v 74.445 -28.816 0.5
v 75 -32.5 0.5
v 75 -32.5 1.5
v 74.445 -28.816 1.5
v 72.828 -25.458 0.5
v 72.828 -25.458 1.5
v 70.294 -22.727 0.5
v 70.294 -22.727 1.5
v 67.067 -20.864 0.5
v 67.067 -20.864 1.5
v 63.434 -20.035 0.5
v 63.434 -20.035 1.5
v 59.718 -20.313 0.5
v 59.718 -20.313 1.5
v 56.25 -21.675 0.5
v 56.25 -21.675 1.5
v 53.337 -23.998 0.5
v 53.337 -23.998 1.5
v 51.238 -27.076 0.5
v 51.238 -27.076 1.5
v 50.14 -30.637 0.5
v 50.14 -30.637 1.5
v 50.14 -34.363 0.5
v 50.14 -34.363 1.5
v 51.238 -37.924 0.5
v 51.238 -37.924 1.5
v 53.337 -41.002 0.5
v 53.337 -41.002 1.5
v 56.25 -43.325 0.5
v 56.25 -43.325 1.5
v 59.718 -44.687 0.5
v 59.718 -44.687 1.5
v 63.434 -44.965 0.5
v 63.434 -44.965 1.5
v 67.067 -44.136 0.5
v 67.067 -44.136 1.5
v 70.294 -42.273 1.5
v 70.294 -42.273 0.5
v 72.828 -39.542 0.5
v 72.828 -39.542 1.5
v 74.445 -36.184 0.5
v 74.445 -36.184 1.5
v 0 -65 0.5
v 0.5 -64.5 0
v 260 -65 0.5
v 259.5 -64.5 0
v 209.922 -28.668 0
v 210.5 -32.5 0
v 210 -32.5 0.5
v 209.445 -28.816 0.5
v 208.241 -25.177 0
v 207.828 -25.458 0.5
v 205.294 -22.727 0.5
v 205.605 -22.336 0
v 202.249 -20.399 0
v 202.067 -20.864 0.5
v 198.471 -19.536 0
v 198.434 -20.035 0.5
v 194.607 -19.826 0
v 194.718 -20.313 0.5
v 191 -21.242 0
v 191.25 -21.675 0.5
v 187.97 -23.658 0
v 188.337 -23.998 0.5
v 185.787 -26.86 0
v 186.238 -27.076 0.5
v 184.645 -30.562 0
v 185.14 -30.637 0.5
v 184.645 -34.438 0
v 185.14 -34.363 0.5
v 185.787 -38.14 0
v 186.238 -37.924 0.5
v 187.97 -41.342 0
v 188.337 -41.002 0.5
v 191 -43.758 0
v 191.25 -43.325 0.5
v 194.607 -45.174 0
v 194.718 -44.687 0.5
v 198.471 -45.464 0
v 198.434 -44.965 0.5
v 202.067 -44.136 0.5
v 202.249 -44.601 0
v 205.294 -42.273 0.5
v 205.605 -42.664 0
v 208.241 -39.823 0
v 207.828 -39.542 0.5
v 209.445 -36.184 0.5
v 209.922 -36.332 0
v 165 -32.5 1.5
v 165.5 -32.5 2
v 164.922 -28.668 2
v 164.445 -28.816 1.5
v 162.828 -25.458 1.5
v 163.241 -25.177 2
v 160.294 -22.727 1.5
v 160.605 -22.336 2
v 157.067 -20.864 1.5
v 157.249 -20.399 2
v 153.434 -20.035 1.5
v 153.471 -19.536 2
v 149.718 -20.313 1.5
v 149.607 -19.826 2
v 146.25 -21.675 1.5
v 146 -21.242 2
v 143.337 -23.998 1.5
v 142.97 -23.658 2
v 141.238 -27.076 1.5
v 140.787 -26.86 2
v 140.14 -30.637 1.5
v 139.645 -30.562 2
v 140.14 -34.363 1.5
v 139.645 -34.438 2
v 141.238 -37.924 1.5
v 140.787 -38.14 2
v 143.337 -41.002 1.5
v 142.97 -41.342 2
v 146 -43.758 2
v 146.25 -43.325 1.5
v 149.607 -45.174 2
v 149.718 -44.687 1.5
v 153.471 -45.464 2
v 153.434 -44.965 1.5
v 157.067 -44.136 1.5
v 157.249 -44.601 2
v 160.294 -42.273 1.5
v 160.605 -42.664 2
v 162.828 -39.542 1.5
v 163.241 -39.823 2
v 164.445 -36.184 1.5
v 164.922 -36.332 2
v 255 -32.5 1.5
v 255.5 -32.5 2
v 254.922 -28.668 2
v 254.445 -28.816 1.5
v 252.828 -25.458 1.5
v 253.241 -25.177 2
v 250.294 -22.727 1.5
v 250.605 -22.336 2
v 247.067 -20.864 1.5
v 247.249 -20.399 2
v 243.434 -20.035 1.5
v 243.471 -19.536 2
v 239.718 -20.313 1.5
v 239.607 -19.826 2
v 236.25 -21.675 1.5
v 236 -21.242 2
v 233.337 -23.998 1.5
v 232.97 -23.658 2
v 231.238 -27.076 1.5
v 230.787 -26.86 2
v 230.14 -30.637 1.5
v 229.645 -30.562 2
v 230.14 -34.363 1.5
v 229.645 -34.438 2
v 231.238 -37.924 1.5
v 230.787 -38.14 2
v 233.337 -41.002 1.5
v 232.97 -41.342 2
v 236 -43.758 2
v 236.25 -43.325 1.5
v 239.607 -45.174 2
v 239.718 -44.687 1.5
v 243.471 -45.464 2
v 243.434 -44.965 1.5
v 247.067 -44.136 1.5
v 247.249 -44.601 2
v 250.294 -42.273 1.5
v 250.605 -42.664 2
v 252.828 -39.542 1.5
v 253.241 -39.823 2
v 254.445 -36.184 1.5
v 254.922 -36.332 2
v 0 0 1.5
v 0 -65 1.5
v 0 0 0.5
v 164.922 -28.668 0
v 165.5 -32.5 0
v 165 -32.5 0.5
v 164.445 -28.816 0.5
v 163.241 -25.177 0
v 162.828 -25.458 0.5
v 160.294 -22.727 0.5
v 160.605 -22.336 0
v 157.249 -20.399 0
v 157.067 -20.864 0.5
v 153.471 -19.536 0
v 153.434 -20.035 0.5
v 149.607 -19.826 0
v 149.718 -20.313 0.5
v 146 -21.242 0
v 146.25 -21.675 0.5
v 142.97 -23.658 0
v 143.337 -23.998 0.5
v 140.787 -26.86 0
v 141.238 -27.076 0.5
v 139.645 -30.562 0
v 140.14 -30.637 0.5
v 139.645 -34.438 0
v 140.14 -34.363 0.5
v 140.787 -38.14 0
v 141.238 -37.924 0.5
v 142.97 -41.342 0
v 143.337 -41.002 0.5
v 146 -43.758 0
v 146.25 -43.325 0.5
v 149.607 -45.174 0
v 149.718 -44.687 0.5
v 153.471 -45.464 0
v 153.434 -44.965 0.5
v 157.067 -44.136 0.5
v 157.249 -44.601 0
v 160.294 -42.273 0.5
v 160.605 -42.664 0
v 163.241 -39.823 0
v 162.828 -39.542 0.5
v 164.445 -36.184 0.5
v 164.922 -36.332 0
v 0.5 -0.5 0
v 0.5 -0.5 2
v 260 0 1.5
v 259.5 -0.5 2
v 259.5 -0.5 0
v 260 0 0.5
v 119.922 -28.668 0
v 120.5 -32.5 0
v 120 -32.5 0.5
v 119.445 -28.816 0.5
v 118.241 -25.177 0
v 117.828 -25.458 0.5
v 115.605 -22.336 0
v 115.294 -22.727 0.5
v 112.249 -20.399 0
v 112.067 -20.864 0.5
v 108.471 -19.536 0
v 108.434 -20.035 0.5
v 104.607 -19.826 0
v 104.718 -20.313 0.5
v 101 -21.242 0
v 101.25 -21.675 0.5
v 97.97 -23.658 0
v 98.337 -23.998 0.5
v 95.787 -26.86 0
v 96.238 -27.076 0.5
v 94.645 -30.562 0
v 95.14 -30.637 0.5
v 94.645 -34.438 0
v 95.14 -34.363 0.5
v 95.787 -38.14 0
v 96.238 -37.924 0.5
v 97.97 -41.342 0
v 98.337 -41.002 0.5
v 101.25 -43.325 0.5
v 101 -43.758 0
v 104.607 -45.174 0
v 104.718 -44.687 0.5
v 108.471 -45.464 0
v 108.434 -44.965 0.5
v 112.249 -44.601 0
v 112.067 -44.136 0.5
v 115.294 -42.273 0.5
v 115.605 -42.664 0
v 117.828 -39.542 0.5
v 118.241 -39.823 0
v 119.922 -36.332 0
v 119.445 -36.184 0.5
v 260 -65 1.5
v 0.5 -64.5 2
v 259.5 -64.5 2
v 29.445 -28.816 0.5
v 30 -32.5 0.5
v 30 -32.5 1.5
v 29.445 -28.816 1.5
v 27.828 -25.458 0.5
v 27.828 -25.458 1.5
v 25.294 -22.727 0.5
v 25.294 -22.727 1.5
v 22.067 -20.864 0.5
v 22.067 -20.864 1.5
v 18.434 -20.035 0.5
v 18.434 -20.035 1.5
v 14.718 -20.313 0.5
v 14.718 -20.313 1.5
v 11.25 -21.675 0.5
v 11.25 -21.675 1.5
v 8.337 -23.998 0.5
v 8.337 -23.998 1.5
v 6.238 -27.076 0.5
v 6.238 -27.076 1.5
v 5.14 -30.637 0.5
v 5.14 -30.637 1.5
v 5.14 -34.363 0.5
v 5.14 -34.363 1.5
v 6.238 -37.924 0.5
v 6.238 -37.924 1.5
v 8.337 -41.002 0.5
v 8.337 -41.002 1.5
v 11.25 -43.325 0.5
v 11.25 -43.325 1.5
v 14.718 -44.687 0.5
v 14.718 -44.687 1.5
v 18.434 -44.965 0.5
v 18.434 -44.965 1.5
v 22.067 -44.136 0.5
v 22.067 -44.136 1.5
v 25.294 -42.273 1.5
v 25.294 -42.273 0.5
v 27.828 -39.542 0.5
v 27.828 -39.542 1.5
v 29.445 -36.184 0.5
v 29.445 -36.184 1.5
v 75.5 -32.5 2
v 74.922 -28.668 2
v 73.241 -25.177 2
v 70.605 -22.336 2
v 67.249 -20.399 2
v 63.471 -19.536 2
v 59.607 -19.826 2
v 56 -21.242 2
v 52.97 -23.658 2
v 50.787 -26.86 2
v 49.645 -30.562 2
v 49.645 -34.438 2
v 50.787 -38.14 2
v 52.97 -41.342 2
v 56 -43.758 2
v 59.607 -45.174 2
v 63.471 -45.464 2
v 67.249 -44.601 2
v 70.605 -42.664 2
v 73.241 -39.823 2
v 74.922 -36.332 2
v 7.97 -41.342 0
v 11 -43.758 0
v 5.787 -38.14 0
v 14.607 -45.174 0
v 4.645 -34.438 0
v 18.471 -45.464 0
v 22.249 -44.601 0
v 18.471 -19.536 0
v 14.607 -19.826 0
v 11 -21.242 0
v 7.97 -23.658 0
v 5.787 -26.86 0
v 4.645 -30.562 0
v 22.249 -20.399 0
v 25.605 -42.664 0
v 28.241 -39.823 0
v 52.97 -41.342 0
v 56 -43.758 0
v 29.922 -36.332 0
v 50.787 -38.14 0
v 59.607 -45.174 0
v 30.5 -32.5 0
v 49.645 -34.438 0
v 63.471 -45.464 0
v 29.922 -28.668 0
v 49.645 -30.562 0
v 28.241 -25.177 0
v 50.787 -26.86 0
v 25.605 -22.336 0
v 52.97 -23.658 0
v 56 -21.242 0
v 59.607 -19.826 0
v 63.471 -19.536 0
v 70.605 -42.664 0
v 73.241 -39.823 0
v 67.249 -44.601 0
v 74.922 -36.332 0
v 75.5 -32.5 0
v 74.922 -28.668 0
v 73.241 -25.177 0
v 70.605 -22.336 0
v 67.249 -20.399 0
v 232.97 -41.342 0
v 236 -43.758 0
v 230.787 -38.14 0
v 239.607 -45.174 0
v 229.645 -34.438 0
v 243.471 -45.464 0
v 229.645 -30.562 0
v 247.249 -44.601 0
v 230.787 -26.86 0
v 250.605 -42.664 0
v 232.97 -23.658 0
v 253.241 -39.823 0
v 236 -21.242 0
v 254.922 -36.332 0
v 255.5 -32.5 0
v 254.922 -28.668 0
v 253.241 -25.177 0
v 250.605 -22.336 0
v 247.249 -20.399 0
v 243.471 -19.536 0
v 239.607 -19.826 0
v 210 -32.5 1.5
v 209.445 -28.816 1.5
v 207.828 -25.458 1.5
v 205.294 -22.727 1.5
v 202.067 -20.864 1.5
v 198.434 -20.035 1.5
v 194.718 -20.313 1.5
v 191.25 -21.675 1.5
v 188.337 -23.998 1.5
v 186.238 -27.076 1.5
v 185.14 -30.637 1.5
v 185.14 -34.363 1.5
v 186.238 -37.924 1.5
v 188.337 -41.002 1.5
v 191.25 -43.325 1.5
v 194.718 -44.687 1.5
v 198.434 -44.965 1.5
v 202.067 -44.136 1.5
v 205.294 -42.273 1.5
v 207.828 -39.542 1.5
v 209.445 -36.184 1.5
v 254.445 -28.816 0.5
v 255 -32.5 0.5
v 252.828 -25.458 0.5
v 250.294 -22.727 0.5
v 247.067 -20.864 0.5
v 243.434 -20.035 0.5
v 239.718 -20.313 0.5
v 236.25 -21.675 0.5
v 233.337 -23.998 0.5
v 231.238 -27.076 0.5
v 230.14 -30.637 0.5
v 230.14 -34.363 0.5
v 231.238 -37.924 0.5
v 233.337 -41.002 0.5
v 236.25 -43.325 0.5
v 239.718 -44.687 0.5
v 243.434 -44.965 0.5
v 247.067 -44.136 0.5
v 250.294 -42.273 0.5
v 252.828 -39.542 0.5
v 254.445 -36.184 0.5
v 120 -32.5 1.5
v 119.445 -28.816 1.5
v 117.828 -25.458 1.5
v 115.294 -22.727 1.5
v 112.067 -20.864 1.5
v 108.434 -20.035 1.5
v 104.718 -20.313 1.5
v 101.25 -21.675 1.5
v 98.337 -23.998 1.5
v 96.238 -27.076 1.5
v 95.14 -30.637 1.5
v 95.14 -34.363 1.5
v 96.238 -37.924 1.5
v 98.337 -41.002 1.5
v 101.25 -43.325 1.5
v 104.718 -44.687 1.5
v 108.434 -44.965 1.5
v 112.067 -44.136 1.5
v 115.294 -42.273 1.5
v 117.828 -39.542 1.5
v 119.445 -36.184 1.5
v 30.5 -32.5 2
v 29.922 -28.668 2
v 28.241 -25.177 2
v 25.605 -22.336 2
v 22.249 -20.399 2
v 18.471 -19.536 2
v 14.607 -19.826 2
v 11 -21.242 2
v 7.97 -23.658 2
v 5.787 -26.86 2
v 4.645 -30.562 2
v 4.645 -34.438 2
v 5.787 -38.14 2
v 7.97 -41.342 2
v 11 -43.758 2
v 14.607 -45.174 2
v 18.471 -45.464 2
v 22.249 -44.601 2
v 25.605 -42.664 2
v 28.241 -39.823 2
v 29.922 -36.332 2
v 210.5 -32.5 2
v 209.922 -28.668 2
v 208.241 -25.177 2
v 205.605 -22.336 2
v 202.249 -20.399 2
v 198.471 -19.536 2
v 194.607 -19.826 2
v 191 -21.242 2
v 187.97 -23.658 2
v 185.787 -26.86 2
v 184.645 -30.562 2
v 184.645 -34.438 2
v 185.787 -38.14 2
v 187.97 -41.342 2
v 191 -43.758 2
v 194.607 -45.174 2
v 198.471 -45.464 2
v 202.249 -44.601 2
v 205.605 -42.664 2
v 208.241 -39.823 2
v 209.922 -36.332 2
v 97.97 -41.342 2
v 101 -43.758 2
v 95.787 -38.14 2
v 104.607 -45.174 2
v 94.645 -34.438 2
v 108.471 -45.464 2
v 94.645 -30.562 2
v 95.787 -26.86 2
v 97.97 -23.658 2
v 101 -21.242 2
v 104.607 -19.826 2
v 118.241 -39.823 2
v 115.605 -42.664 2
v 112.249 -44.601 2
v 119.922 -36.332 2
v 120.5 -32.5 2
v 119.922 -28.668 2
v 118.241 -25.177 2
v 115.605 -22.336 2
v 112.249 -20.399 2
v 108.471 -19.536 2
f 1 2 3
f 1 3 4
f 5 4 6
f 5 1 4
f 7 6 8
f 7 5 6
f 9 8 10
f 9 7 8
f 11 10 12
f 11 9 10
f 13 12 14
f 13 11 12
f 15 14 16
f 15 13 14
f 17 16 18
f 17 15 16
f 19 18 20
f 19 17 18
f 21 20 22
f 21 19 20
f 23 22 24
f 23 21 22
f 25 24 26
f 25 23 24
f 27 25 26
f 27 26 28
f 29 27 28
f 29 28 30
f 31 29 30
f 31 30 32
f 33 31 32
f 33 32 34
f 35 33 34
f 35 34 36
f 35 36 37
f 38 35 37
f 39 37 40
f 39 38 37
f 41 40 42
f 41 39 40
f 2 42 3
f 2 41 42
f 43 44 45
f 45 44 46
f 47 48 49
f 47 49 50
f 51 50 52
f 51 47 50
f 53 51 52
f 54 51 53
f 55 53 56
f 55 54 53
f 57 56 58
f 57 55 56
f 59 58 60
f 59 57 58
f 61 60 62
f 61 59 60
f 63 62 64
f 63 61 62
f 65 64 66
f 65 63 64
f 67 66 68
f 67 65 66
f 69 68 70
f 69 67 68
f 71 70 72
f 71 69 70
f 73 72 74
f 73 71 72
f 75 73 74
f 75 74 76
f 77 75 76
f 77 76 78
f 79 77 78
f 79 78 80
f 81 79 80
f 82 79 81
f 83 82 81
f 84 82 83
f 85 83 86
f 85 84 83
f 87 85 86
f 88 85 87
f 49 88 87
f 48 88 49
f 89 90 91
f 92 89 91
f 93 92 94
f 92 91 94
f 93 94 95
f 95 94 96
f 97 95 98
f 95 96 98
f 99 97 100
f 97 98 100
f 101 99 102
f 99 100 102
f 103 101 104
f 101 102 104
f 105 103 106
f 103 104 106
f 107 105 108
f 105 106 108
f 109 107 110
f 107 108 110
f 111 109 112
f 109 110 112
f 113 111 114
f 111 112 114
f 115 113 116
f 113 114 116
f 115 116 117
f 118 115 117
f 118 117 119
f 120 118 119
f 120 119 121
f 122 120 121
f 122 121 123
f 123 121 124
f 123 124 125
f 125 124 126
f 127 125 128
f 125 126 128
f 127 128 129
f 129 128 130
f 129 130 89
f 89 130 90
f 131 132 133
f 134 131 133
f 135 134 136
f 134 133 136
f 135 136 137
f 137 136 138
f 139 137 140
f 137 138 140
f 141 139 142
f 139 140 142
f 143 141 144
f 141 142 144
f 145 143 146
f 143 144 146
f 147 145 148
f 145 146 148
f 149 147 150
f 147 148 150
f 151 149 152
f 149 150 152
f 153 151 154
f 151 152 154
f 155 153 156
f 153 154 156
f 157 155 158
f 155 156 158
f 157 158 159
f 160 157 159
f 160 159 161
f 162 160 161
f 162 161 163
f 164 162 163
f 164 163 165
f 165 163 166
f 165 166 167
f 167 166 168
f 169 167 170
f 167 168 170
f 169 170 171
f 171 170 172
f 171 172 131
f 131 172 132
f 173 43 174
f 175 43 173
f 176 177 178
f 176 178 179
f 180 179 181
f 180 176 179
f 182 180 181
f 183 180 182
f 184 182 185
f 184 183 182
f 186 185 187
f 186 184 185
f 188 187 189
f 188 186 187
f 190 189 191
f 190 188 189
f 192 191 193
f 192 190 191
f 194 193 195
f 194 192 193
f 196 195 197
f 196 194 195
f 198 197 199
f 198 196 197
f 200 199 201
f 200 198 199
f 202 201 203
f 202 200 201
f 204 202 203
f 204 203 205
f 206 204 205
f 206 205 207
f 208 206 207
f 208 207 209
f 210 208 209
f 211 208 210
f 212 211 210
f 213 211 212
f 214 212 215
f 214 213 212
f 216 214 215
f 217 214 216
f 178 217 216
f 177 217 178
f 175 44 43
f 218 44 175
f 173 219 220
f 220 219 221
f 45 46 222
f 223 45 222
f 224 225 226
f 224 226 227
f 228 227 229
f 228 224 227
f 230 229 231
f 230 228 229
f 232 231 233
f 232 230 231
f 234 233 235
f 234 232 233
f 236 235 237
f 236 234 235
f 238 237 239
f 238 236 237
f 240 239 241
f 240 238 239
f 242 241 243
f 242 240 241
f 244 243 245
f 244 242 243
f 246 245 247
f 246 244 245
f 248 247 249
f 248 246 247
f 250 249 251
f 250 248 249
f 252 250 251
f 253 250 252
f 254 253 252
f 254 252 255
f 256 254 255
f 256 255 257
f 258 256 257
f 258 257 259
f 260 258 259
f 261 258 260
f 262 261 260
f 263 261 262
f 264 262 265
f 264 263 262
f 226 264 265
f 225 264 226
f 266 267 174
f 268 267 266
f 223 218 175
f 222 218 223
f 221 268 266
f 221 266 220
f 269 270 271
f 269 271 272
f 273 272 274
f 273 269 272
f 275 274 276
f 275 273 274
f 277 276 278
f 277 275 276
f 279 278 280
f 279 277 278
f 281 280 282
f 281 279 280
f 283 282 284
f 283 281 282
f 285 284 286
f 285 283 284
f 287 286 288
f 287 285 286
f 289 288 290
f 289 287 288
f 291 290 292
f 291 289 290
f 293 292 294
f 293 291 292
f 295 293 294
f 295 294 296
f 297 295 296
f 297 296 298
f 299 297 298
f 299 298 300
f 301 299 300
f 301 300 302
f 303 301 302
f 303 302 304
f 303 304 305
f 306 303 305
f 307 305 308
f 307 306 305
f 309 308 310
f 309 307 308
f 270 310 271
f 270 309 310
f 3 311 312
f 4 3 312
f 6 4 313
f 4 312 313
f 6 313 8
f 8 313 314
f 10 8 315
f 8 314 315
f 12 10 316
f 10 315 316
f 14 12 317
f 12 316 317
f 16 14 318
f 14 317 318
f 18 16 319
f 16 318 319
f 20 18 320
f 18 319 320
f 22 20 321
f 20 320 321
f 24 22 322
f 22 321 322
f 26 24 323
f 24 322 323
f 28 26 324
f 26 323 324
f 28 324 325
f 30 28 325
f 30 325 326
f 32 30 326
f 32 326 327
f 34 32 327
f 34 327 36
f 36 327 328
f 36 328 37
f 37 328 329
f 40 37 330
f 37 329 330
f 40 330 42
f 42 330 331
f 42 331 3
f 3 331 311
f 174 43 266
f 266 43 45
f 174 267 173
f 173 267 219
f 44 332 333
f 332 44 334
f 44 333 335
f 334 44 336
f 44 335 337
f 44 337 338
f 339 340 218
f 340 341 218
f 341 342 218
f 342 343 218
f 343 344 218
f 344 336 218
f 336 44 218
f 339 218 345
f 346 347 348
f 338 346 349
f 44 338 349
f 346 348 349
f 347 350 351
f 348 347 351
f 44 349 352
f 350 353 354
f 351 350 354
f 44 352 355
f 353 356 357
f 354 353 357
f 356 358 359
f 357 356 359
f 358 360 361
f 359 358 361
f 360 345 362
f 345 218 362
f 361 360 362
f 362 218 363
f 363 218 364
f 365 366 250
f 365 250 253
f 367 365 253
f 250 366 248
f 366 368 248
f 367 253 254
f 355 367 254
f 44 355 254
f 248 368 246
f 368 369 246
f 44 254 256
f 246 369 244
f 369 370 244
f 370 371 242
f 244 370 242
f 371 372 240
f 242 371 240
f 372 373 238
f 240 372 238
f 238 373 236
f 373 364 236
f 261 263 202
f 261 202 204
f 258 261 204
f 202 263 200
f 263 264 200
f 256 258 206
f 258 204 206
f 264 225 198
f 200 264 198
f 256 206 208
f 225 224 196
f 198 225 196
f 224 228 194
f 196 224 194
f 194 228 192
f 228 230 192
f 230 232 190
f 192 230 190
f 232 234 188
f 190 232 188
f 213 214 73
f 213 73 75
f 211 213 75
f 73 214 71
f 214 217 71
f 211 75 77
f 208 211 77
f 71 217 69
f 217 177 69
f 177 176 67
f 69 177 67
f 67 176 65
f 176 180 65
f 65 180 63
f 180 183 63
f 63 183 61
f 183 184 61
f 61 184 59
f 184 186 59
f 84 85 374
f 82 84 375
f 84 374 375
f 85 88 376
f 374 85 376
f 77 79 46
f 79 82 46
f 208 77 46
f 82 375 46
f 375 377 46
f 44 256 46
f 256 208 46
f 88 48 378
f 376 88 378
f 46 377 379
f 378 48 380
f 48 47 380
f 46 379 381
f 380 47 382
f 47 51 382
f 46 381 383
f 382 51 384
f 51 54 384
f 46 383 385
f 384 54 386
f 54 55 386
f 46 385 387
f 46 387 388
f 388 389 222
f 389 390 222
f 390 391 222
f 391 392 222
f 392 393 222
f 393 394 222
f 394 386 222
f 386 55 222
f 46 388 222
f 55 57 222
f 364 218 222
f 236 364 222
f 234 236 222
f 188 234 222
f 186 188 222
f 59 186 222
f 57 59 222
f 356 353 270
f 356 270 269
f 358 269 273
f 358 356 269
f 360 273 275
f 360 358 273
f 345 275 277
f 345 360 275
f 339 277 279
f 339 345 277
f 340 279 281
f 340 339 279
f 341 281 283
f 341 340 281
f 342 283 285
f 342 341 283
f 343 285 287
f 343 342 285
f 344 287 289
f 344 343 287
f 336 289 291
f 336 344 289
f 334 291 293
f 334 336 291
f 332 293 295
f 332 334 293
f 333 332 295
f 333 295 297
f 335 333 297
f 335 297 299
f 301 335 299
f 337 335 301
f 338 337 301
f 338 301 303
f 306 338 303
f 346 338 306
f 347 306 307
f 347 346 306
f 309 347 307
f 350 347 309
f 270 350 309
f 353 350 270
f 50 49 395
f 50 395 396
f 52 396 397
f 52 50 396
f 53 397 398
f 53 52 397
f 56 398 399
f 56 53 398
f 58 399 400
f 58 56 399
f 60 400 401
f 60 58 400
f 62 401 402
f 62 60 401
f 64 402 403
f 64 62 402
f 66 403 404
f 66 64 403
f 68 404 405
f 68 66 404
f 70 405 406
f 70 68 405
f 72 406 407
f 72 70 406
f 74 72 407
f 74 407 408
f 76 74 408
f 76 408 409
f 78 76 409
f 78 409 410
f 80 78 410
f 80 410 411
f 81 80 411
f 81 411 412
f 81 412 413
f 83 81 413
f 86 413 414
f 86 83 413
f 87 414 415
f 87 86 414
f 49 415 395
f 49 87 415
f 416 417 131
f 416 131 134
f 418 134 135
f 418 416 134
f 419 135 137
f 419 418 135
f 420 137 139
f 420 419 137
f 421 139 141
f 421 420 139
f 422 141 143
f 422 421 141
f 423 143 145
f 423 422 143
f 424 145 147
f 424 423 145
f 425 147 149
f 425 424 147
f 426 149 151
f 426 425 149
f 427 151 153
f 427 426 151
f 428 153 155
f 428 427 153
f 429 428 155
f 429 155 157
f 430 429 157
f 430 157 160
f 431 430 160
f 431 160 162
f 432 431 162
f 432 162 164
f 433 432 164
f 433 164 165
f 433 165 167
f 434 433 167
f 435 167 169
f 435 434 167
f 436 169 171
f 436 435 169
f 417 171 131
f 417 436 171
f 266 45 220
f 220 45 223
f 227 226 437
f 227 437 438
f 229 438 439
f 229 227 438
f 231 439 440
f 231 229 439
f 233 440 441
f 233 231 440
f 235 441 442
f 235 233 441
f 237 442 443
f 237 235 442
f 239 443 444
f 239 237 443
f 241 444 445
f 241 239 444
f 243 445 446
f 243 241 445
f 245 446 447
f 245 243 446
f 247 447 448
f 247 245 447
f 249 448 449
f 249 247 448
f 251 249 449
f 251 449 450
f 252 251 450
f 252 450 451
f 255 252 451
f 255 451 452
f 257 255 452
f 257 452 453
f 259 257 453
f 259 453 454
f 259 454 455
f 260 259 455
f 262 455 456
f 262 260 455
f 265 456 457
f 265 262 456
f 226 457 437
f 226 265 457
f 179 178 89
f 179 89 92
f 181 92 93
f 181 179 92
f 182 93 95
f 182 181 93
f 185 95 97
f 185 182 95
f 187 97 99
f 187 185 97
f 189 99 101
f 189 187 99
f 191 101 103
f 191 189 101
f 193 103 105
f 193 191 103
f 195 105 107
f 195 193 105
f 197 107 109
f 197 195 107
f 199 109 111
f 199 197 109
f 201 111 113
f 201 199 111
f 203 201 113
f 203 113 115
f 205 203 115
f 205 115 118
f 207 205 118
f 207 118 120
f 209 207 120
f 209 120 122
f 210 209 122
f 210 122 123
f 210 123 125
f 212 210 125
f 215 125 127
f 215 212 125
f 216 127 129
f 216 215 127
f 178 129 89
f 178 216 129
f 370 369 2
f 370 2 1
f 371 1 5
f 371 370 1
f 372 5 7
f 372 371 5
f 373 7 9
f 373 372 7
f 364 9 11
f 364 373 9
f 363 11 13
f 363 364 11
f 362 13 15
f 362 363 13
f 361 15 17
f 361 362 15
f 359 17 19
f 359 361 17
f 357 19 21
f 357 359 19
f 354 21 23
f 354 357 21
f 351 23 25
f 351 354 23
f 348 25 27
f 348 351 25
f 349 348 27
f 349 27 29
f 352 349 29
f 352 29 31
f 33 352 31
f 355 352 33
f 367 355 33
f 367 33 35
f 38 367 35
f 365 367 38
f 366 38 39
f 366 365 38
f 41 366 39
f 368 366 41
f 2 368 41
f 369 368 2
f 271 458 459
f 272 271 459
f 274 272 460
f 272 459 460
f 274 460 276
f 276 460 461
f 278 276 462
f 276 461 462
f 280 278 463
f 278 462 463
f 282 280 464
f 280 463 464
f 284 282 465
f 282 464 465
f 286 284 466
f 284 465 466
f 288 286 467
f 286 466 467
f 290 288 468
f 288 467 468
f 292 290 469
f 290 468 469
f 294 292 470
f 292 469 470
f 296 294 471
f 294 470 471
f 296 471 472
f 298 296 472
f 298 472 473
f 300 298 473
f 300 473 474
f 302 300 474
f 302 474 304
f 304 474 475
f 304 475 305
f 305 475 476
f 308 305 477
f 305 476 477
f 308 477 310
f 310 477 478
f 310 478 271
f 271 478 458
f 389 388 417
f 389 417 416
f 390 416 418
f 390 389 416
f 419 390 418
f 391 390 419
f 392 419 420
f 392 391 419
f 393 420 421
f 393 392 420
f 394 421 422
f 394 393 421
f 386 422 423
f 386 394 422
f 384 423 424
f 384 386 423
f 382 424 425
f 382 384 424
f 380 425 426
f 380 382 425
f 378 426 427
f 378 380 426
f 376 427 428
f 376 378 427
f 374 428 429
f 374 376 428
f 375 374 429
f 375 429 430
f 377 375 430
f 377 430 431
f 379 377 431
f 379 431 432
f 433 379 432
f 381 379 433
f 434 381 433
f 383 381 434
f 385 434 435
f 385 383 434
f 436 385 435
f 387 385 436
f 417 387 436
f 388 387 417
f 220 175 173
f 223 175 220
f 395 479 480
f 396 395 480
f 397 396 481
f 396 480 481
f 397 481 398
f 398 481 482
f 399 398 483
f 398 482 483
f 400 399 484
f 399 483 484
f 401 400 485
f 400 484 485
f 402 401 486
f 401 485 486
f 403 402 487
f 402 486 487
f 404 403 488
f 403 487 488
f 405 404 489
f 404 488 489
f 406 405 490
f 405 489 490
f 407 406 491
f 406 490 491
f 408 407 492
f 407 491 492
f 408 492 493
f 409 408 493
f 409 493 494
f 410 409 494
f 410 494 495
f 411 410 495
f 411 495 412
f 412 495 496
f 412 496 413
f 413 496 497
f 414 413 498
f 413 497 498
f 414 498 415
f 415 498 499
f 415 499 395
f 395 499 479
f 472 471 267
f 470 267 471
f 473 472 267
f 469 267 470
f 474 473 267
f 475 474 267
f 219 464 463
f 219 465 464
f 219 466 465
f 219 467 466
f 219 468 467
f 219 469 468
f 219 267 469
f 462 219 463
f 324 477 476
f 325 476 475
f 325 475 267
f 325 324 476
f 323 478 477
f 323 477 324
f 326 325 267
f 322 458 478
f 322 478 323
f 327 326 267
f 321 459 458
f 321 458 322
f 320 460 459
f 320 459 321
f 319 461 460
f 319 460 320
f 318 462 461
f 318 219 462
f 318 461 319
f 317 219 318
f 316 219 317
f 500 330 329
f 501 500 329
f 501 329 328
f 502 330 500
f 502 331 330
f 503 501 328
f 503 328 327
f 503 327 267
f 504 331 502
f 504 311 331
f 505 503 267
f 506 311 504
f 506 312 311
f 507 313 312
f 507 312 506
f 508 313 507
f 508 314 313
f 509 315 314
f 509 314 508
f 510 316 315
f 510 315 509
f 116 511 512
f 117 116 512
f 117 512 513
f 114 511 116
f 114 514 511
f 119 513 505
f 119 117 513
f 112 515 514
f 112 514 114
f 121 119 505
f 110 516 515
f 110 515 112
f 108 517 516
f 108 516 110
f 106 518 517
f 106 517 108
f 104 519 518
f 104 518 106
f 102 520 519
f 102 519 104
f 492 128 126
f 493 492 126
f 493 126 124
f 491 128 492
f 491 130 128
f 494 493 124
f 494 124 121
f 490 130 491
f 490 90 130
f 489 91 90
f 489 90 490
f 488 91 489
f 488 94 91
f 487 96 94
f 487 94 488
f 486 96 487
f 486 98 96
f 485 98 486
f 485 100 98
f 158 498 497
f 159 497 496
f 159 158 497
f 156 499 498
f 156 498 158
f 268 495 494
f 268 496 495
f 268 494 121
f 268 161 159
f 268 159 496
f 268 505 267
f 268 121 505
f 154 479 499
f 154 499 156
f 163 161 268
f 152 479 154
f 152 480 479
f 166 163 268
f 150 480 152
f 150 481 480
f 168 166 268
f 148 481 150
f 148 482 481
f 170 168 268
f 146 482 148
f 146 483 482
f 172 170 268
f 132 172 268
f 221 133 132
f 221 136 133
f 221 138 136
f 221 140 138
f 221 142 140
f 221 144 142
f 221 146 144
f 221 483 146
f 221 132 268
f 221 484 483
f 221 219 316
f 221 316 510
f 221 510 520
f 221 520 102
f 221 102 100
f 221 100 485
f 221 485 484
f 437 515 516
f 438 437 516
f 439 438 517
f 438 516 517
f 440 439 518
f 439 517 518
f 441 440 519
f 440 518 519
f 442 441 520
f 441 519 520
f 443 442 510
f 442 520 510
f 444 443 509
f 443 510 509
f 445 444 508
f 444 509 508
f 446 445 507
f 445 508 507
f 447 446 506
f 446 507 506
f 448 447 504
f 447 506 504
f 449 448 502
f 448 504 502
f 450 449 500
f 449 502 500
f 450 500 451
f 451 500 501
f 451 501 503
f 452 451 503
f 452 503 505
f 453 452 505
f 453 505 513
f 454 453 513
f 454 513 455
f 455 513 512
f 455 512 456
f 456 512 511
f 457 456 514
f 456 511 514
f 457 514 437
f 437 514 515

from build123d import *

# Parameters (mm, degrees)
F0_W     = 260
F0_H     = 65
F0_R     = 12.5
F1_DEPTH = 2
F2_SIZE  = 0.5


with BuildPart() as f1:
    # F0 (on Top) → F1 (new body)
    with BuildSketch(Plane.XY):
        with Locations((130, -32.5)):
            Rectangle(F0_W, F0_H)
        with Locations((17.5, -32.5)):
            Circle(F0_R, mode=Mode.SUBTRACT)
        with Locations((62.5, -32.5)):
            Circle(F0_R, mode=Mode.SUBTRACT)
        with Locations((107.5, -32.5)):
            Circle(F0_R, mode=Mode.SUBTRACT)
        with Locations((152.5, -32.5)):
            Circle(F0_R, mode=Mode.SUBTRACT)
        with Locations((197.5, -32.5)):
            Circle(F0_R, mode=Mode.SUBTRACT)
        with Locations((242.5, -32.5)):
            Circle(F0_R, mode=Mode.SUBTRACT)
    extrude(amount=F1_DEPTH)

    # F2
    f2_edges = [f1.edges().sort_by_distance(p)[0] for p in [
        (130, 0, 2),
        (0, -32.5, 2),
        (130, -65, 2),
        (260, -32.5, 2),
        (5, -32.5, 2),
        (50, -32.5, 2),
        (95, -32.5, 2),
        (140, -32.5, 2),
        (185, -32.5, 2),
        (230, -32.5, 2),
        (130, 0, 0),
        (0, -32.5, 0),
        (130, -65, 0),
        (260, -32.5, 0),
        (5, -32.5, 0),
        (50, -32.5, 0),
        (95, -32.5, 0),
        (140, -32.5, 0),
        (185, -32.5, 0),
        (230, -32.5, 0),
    ]]
    chamfer(f2_edges, length=F2_SIZE)


solid = f1.part
